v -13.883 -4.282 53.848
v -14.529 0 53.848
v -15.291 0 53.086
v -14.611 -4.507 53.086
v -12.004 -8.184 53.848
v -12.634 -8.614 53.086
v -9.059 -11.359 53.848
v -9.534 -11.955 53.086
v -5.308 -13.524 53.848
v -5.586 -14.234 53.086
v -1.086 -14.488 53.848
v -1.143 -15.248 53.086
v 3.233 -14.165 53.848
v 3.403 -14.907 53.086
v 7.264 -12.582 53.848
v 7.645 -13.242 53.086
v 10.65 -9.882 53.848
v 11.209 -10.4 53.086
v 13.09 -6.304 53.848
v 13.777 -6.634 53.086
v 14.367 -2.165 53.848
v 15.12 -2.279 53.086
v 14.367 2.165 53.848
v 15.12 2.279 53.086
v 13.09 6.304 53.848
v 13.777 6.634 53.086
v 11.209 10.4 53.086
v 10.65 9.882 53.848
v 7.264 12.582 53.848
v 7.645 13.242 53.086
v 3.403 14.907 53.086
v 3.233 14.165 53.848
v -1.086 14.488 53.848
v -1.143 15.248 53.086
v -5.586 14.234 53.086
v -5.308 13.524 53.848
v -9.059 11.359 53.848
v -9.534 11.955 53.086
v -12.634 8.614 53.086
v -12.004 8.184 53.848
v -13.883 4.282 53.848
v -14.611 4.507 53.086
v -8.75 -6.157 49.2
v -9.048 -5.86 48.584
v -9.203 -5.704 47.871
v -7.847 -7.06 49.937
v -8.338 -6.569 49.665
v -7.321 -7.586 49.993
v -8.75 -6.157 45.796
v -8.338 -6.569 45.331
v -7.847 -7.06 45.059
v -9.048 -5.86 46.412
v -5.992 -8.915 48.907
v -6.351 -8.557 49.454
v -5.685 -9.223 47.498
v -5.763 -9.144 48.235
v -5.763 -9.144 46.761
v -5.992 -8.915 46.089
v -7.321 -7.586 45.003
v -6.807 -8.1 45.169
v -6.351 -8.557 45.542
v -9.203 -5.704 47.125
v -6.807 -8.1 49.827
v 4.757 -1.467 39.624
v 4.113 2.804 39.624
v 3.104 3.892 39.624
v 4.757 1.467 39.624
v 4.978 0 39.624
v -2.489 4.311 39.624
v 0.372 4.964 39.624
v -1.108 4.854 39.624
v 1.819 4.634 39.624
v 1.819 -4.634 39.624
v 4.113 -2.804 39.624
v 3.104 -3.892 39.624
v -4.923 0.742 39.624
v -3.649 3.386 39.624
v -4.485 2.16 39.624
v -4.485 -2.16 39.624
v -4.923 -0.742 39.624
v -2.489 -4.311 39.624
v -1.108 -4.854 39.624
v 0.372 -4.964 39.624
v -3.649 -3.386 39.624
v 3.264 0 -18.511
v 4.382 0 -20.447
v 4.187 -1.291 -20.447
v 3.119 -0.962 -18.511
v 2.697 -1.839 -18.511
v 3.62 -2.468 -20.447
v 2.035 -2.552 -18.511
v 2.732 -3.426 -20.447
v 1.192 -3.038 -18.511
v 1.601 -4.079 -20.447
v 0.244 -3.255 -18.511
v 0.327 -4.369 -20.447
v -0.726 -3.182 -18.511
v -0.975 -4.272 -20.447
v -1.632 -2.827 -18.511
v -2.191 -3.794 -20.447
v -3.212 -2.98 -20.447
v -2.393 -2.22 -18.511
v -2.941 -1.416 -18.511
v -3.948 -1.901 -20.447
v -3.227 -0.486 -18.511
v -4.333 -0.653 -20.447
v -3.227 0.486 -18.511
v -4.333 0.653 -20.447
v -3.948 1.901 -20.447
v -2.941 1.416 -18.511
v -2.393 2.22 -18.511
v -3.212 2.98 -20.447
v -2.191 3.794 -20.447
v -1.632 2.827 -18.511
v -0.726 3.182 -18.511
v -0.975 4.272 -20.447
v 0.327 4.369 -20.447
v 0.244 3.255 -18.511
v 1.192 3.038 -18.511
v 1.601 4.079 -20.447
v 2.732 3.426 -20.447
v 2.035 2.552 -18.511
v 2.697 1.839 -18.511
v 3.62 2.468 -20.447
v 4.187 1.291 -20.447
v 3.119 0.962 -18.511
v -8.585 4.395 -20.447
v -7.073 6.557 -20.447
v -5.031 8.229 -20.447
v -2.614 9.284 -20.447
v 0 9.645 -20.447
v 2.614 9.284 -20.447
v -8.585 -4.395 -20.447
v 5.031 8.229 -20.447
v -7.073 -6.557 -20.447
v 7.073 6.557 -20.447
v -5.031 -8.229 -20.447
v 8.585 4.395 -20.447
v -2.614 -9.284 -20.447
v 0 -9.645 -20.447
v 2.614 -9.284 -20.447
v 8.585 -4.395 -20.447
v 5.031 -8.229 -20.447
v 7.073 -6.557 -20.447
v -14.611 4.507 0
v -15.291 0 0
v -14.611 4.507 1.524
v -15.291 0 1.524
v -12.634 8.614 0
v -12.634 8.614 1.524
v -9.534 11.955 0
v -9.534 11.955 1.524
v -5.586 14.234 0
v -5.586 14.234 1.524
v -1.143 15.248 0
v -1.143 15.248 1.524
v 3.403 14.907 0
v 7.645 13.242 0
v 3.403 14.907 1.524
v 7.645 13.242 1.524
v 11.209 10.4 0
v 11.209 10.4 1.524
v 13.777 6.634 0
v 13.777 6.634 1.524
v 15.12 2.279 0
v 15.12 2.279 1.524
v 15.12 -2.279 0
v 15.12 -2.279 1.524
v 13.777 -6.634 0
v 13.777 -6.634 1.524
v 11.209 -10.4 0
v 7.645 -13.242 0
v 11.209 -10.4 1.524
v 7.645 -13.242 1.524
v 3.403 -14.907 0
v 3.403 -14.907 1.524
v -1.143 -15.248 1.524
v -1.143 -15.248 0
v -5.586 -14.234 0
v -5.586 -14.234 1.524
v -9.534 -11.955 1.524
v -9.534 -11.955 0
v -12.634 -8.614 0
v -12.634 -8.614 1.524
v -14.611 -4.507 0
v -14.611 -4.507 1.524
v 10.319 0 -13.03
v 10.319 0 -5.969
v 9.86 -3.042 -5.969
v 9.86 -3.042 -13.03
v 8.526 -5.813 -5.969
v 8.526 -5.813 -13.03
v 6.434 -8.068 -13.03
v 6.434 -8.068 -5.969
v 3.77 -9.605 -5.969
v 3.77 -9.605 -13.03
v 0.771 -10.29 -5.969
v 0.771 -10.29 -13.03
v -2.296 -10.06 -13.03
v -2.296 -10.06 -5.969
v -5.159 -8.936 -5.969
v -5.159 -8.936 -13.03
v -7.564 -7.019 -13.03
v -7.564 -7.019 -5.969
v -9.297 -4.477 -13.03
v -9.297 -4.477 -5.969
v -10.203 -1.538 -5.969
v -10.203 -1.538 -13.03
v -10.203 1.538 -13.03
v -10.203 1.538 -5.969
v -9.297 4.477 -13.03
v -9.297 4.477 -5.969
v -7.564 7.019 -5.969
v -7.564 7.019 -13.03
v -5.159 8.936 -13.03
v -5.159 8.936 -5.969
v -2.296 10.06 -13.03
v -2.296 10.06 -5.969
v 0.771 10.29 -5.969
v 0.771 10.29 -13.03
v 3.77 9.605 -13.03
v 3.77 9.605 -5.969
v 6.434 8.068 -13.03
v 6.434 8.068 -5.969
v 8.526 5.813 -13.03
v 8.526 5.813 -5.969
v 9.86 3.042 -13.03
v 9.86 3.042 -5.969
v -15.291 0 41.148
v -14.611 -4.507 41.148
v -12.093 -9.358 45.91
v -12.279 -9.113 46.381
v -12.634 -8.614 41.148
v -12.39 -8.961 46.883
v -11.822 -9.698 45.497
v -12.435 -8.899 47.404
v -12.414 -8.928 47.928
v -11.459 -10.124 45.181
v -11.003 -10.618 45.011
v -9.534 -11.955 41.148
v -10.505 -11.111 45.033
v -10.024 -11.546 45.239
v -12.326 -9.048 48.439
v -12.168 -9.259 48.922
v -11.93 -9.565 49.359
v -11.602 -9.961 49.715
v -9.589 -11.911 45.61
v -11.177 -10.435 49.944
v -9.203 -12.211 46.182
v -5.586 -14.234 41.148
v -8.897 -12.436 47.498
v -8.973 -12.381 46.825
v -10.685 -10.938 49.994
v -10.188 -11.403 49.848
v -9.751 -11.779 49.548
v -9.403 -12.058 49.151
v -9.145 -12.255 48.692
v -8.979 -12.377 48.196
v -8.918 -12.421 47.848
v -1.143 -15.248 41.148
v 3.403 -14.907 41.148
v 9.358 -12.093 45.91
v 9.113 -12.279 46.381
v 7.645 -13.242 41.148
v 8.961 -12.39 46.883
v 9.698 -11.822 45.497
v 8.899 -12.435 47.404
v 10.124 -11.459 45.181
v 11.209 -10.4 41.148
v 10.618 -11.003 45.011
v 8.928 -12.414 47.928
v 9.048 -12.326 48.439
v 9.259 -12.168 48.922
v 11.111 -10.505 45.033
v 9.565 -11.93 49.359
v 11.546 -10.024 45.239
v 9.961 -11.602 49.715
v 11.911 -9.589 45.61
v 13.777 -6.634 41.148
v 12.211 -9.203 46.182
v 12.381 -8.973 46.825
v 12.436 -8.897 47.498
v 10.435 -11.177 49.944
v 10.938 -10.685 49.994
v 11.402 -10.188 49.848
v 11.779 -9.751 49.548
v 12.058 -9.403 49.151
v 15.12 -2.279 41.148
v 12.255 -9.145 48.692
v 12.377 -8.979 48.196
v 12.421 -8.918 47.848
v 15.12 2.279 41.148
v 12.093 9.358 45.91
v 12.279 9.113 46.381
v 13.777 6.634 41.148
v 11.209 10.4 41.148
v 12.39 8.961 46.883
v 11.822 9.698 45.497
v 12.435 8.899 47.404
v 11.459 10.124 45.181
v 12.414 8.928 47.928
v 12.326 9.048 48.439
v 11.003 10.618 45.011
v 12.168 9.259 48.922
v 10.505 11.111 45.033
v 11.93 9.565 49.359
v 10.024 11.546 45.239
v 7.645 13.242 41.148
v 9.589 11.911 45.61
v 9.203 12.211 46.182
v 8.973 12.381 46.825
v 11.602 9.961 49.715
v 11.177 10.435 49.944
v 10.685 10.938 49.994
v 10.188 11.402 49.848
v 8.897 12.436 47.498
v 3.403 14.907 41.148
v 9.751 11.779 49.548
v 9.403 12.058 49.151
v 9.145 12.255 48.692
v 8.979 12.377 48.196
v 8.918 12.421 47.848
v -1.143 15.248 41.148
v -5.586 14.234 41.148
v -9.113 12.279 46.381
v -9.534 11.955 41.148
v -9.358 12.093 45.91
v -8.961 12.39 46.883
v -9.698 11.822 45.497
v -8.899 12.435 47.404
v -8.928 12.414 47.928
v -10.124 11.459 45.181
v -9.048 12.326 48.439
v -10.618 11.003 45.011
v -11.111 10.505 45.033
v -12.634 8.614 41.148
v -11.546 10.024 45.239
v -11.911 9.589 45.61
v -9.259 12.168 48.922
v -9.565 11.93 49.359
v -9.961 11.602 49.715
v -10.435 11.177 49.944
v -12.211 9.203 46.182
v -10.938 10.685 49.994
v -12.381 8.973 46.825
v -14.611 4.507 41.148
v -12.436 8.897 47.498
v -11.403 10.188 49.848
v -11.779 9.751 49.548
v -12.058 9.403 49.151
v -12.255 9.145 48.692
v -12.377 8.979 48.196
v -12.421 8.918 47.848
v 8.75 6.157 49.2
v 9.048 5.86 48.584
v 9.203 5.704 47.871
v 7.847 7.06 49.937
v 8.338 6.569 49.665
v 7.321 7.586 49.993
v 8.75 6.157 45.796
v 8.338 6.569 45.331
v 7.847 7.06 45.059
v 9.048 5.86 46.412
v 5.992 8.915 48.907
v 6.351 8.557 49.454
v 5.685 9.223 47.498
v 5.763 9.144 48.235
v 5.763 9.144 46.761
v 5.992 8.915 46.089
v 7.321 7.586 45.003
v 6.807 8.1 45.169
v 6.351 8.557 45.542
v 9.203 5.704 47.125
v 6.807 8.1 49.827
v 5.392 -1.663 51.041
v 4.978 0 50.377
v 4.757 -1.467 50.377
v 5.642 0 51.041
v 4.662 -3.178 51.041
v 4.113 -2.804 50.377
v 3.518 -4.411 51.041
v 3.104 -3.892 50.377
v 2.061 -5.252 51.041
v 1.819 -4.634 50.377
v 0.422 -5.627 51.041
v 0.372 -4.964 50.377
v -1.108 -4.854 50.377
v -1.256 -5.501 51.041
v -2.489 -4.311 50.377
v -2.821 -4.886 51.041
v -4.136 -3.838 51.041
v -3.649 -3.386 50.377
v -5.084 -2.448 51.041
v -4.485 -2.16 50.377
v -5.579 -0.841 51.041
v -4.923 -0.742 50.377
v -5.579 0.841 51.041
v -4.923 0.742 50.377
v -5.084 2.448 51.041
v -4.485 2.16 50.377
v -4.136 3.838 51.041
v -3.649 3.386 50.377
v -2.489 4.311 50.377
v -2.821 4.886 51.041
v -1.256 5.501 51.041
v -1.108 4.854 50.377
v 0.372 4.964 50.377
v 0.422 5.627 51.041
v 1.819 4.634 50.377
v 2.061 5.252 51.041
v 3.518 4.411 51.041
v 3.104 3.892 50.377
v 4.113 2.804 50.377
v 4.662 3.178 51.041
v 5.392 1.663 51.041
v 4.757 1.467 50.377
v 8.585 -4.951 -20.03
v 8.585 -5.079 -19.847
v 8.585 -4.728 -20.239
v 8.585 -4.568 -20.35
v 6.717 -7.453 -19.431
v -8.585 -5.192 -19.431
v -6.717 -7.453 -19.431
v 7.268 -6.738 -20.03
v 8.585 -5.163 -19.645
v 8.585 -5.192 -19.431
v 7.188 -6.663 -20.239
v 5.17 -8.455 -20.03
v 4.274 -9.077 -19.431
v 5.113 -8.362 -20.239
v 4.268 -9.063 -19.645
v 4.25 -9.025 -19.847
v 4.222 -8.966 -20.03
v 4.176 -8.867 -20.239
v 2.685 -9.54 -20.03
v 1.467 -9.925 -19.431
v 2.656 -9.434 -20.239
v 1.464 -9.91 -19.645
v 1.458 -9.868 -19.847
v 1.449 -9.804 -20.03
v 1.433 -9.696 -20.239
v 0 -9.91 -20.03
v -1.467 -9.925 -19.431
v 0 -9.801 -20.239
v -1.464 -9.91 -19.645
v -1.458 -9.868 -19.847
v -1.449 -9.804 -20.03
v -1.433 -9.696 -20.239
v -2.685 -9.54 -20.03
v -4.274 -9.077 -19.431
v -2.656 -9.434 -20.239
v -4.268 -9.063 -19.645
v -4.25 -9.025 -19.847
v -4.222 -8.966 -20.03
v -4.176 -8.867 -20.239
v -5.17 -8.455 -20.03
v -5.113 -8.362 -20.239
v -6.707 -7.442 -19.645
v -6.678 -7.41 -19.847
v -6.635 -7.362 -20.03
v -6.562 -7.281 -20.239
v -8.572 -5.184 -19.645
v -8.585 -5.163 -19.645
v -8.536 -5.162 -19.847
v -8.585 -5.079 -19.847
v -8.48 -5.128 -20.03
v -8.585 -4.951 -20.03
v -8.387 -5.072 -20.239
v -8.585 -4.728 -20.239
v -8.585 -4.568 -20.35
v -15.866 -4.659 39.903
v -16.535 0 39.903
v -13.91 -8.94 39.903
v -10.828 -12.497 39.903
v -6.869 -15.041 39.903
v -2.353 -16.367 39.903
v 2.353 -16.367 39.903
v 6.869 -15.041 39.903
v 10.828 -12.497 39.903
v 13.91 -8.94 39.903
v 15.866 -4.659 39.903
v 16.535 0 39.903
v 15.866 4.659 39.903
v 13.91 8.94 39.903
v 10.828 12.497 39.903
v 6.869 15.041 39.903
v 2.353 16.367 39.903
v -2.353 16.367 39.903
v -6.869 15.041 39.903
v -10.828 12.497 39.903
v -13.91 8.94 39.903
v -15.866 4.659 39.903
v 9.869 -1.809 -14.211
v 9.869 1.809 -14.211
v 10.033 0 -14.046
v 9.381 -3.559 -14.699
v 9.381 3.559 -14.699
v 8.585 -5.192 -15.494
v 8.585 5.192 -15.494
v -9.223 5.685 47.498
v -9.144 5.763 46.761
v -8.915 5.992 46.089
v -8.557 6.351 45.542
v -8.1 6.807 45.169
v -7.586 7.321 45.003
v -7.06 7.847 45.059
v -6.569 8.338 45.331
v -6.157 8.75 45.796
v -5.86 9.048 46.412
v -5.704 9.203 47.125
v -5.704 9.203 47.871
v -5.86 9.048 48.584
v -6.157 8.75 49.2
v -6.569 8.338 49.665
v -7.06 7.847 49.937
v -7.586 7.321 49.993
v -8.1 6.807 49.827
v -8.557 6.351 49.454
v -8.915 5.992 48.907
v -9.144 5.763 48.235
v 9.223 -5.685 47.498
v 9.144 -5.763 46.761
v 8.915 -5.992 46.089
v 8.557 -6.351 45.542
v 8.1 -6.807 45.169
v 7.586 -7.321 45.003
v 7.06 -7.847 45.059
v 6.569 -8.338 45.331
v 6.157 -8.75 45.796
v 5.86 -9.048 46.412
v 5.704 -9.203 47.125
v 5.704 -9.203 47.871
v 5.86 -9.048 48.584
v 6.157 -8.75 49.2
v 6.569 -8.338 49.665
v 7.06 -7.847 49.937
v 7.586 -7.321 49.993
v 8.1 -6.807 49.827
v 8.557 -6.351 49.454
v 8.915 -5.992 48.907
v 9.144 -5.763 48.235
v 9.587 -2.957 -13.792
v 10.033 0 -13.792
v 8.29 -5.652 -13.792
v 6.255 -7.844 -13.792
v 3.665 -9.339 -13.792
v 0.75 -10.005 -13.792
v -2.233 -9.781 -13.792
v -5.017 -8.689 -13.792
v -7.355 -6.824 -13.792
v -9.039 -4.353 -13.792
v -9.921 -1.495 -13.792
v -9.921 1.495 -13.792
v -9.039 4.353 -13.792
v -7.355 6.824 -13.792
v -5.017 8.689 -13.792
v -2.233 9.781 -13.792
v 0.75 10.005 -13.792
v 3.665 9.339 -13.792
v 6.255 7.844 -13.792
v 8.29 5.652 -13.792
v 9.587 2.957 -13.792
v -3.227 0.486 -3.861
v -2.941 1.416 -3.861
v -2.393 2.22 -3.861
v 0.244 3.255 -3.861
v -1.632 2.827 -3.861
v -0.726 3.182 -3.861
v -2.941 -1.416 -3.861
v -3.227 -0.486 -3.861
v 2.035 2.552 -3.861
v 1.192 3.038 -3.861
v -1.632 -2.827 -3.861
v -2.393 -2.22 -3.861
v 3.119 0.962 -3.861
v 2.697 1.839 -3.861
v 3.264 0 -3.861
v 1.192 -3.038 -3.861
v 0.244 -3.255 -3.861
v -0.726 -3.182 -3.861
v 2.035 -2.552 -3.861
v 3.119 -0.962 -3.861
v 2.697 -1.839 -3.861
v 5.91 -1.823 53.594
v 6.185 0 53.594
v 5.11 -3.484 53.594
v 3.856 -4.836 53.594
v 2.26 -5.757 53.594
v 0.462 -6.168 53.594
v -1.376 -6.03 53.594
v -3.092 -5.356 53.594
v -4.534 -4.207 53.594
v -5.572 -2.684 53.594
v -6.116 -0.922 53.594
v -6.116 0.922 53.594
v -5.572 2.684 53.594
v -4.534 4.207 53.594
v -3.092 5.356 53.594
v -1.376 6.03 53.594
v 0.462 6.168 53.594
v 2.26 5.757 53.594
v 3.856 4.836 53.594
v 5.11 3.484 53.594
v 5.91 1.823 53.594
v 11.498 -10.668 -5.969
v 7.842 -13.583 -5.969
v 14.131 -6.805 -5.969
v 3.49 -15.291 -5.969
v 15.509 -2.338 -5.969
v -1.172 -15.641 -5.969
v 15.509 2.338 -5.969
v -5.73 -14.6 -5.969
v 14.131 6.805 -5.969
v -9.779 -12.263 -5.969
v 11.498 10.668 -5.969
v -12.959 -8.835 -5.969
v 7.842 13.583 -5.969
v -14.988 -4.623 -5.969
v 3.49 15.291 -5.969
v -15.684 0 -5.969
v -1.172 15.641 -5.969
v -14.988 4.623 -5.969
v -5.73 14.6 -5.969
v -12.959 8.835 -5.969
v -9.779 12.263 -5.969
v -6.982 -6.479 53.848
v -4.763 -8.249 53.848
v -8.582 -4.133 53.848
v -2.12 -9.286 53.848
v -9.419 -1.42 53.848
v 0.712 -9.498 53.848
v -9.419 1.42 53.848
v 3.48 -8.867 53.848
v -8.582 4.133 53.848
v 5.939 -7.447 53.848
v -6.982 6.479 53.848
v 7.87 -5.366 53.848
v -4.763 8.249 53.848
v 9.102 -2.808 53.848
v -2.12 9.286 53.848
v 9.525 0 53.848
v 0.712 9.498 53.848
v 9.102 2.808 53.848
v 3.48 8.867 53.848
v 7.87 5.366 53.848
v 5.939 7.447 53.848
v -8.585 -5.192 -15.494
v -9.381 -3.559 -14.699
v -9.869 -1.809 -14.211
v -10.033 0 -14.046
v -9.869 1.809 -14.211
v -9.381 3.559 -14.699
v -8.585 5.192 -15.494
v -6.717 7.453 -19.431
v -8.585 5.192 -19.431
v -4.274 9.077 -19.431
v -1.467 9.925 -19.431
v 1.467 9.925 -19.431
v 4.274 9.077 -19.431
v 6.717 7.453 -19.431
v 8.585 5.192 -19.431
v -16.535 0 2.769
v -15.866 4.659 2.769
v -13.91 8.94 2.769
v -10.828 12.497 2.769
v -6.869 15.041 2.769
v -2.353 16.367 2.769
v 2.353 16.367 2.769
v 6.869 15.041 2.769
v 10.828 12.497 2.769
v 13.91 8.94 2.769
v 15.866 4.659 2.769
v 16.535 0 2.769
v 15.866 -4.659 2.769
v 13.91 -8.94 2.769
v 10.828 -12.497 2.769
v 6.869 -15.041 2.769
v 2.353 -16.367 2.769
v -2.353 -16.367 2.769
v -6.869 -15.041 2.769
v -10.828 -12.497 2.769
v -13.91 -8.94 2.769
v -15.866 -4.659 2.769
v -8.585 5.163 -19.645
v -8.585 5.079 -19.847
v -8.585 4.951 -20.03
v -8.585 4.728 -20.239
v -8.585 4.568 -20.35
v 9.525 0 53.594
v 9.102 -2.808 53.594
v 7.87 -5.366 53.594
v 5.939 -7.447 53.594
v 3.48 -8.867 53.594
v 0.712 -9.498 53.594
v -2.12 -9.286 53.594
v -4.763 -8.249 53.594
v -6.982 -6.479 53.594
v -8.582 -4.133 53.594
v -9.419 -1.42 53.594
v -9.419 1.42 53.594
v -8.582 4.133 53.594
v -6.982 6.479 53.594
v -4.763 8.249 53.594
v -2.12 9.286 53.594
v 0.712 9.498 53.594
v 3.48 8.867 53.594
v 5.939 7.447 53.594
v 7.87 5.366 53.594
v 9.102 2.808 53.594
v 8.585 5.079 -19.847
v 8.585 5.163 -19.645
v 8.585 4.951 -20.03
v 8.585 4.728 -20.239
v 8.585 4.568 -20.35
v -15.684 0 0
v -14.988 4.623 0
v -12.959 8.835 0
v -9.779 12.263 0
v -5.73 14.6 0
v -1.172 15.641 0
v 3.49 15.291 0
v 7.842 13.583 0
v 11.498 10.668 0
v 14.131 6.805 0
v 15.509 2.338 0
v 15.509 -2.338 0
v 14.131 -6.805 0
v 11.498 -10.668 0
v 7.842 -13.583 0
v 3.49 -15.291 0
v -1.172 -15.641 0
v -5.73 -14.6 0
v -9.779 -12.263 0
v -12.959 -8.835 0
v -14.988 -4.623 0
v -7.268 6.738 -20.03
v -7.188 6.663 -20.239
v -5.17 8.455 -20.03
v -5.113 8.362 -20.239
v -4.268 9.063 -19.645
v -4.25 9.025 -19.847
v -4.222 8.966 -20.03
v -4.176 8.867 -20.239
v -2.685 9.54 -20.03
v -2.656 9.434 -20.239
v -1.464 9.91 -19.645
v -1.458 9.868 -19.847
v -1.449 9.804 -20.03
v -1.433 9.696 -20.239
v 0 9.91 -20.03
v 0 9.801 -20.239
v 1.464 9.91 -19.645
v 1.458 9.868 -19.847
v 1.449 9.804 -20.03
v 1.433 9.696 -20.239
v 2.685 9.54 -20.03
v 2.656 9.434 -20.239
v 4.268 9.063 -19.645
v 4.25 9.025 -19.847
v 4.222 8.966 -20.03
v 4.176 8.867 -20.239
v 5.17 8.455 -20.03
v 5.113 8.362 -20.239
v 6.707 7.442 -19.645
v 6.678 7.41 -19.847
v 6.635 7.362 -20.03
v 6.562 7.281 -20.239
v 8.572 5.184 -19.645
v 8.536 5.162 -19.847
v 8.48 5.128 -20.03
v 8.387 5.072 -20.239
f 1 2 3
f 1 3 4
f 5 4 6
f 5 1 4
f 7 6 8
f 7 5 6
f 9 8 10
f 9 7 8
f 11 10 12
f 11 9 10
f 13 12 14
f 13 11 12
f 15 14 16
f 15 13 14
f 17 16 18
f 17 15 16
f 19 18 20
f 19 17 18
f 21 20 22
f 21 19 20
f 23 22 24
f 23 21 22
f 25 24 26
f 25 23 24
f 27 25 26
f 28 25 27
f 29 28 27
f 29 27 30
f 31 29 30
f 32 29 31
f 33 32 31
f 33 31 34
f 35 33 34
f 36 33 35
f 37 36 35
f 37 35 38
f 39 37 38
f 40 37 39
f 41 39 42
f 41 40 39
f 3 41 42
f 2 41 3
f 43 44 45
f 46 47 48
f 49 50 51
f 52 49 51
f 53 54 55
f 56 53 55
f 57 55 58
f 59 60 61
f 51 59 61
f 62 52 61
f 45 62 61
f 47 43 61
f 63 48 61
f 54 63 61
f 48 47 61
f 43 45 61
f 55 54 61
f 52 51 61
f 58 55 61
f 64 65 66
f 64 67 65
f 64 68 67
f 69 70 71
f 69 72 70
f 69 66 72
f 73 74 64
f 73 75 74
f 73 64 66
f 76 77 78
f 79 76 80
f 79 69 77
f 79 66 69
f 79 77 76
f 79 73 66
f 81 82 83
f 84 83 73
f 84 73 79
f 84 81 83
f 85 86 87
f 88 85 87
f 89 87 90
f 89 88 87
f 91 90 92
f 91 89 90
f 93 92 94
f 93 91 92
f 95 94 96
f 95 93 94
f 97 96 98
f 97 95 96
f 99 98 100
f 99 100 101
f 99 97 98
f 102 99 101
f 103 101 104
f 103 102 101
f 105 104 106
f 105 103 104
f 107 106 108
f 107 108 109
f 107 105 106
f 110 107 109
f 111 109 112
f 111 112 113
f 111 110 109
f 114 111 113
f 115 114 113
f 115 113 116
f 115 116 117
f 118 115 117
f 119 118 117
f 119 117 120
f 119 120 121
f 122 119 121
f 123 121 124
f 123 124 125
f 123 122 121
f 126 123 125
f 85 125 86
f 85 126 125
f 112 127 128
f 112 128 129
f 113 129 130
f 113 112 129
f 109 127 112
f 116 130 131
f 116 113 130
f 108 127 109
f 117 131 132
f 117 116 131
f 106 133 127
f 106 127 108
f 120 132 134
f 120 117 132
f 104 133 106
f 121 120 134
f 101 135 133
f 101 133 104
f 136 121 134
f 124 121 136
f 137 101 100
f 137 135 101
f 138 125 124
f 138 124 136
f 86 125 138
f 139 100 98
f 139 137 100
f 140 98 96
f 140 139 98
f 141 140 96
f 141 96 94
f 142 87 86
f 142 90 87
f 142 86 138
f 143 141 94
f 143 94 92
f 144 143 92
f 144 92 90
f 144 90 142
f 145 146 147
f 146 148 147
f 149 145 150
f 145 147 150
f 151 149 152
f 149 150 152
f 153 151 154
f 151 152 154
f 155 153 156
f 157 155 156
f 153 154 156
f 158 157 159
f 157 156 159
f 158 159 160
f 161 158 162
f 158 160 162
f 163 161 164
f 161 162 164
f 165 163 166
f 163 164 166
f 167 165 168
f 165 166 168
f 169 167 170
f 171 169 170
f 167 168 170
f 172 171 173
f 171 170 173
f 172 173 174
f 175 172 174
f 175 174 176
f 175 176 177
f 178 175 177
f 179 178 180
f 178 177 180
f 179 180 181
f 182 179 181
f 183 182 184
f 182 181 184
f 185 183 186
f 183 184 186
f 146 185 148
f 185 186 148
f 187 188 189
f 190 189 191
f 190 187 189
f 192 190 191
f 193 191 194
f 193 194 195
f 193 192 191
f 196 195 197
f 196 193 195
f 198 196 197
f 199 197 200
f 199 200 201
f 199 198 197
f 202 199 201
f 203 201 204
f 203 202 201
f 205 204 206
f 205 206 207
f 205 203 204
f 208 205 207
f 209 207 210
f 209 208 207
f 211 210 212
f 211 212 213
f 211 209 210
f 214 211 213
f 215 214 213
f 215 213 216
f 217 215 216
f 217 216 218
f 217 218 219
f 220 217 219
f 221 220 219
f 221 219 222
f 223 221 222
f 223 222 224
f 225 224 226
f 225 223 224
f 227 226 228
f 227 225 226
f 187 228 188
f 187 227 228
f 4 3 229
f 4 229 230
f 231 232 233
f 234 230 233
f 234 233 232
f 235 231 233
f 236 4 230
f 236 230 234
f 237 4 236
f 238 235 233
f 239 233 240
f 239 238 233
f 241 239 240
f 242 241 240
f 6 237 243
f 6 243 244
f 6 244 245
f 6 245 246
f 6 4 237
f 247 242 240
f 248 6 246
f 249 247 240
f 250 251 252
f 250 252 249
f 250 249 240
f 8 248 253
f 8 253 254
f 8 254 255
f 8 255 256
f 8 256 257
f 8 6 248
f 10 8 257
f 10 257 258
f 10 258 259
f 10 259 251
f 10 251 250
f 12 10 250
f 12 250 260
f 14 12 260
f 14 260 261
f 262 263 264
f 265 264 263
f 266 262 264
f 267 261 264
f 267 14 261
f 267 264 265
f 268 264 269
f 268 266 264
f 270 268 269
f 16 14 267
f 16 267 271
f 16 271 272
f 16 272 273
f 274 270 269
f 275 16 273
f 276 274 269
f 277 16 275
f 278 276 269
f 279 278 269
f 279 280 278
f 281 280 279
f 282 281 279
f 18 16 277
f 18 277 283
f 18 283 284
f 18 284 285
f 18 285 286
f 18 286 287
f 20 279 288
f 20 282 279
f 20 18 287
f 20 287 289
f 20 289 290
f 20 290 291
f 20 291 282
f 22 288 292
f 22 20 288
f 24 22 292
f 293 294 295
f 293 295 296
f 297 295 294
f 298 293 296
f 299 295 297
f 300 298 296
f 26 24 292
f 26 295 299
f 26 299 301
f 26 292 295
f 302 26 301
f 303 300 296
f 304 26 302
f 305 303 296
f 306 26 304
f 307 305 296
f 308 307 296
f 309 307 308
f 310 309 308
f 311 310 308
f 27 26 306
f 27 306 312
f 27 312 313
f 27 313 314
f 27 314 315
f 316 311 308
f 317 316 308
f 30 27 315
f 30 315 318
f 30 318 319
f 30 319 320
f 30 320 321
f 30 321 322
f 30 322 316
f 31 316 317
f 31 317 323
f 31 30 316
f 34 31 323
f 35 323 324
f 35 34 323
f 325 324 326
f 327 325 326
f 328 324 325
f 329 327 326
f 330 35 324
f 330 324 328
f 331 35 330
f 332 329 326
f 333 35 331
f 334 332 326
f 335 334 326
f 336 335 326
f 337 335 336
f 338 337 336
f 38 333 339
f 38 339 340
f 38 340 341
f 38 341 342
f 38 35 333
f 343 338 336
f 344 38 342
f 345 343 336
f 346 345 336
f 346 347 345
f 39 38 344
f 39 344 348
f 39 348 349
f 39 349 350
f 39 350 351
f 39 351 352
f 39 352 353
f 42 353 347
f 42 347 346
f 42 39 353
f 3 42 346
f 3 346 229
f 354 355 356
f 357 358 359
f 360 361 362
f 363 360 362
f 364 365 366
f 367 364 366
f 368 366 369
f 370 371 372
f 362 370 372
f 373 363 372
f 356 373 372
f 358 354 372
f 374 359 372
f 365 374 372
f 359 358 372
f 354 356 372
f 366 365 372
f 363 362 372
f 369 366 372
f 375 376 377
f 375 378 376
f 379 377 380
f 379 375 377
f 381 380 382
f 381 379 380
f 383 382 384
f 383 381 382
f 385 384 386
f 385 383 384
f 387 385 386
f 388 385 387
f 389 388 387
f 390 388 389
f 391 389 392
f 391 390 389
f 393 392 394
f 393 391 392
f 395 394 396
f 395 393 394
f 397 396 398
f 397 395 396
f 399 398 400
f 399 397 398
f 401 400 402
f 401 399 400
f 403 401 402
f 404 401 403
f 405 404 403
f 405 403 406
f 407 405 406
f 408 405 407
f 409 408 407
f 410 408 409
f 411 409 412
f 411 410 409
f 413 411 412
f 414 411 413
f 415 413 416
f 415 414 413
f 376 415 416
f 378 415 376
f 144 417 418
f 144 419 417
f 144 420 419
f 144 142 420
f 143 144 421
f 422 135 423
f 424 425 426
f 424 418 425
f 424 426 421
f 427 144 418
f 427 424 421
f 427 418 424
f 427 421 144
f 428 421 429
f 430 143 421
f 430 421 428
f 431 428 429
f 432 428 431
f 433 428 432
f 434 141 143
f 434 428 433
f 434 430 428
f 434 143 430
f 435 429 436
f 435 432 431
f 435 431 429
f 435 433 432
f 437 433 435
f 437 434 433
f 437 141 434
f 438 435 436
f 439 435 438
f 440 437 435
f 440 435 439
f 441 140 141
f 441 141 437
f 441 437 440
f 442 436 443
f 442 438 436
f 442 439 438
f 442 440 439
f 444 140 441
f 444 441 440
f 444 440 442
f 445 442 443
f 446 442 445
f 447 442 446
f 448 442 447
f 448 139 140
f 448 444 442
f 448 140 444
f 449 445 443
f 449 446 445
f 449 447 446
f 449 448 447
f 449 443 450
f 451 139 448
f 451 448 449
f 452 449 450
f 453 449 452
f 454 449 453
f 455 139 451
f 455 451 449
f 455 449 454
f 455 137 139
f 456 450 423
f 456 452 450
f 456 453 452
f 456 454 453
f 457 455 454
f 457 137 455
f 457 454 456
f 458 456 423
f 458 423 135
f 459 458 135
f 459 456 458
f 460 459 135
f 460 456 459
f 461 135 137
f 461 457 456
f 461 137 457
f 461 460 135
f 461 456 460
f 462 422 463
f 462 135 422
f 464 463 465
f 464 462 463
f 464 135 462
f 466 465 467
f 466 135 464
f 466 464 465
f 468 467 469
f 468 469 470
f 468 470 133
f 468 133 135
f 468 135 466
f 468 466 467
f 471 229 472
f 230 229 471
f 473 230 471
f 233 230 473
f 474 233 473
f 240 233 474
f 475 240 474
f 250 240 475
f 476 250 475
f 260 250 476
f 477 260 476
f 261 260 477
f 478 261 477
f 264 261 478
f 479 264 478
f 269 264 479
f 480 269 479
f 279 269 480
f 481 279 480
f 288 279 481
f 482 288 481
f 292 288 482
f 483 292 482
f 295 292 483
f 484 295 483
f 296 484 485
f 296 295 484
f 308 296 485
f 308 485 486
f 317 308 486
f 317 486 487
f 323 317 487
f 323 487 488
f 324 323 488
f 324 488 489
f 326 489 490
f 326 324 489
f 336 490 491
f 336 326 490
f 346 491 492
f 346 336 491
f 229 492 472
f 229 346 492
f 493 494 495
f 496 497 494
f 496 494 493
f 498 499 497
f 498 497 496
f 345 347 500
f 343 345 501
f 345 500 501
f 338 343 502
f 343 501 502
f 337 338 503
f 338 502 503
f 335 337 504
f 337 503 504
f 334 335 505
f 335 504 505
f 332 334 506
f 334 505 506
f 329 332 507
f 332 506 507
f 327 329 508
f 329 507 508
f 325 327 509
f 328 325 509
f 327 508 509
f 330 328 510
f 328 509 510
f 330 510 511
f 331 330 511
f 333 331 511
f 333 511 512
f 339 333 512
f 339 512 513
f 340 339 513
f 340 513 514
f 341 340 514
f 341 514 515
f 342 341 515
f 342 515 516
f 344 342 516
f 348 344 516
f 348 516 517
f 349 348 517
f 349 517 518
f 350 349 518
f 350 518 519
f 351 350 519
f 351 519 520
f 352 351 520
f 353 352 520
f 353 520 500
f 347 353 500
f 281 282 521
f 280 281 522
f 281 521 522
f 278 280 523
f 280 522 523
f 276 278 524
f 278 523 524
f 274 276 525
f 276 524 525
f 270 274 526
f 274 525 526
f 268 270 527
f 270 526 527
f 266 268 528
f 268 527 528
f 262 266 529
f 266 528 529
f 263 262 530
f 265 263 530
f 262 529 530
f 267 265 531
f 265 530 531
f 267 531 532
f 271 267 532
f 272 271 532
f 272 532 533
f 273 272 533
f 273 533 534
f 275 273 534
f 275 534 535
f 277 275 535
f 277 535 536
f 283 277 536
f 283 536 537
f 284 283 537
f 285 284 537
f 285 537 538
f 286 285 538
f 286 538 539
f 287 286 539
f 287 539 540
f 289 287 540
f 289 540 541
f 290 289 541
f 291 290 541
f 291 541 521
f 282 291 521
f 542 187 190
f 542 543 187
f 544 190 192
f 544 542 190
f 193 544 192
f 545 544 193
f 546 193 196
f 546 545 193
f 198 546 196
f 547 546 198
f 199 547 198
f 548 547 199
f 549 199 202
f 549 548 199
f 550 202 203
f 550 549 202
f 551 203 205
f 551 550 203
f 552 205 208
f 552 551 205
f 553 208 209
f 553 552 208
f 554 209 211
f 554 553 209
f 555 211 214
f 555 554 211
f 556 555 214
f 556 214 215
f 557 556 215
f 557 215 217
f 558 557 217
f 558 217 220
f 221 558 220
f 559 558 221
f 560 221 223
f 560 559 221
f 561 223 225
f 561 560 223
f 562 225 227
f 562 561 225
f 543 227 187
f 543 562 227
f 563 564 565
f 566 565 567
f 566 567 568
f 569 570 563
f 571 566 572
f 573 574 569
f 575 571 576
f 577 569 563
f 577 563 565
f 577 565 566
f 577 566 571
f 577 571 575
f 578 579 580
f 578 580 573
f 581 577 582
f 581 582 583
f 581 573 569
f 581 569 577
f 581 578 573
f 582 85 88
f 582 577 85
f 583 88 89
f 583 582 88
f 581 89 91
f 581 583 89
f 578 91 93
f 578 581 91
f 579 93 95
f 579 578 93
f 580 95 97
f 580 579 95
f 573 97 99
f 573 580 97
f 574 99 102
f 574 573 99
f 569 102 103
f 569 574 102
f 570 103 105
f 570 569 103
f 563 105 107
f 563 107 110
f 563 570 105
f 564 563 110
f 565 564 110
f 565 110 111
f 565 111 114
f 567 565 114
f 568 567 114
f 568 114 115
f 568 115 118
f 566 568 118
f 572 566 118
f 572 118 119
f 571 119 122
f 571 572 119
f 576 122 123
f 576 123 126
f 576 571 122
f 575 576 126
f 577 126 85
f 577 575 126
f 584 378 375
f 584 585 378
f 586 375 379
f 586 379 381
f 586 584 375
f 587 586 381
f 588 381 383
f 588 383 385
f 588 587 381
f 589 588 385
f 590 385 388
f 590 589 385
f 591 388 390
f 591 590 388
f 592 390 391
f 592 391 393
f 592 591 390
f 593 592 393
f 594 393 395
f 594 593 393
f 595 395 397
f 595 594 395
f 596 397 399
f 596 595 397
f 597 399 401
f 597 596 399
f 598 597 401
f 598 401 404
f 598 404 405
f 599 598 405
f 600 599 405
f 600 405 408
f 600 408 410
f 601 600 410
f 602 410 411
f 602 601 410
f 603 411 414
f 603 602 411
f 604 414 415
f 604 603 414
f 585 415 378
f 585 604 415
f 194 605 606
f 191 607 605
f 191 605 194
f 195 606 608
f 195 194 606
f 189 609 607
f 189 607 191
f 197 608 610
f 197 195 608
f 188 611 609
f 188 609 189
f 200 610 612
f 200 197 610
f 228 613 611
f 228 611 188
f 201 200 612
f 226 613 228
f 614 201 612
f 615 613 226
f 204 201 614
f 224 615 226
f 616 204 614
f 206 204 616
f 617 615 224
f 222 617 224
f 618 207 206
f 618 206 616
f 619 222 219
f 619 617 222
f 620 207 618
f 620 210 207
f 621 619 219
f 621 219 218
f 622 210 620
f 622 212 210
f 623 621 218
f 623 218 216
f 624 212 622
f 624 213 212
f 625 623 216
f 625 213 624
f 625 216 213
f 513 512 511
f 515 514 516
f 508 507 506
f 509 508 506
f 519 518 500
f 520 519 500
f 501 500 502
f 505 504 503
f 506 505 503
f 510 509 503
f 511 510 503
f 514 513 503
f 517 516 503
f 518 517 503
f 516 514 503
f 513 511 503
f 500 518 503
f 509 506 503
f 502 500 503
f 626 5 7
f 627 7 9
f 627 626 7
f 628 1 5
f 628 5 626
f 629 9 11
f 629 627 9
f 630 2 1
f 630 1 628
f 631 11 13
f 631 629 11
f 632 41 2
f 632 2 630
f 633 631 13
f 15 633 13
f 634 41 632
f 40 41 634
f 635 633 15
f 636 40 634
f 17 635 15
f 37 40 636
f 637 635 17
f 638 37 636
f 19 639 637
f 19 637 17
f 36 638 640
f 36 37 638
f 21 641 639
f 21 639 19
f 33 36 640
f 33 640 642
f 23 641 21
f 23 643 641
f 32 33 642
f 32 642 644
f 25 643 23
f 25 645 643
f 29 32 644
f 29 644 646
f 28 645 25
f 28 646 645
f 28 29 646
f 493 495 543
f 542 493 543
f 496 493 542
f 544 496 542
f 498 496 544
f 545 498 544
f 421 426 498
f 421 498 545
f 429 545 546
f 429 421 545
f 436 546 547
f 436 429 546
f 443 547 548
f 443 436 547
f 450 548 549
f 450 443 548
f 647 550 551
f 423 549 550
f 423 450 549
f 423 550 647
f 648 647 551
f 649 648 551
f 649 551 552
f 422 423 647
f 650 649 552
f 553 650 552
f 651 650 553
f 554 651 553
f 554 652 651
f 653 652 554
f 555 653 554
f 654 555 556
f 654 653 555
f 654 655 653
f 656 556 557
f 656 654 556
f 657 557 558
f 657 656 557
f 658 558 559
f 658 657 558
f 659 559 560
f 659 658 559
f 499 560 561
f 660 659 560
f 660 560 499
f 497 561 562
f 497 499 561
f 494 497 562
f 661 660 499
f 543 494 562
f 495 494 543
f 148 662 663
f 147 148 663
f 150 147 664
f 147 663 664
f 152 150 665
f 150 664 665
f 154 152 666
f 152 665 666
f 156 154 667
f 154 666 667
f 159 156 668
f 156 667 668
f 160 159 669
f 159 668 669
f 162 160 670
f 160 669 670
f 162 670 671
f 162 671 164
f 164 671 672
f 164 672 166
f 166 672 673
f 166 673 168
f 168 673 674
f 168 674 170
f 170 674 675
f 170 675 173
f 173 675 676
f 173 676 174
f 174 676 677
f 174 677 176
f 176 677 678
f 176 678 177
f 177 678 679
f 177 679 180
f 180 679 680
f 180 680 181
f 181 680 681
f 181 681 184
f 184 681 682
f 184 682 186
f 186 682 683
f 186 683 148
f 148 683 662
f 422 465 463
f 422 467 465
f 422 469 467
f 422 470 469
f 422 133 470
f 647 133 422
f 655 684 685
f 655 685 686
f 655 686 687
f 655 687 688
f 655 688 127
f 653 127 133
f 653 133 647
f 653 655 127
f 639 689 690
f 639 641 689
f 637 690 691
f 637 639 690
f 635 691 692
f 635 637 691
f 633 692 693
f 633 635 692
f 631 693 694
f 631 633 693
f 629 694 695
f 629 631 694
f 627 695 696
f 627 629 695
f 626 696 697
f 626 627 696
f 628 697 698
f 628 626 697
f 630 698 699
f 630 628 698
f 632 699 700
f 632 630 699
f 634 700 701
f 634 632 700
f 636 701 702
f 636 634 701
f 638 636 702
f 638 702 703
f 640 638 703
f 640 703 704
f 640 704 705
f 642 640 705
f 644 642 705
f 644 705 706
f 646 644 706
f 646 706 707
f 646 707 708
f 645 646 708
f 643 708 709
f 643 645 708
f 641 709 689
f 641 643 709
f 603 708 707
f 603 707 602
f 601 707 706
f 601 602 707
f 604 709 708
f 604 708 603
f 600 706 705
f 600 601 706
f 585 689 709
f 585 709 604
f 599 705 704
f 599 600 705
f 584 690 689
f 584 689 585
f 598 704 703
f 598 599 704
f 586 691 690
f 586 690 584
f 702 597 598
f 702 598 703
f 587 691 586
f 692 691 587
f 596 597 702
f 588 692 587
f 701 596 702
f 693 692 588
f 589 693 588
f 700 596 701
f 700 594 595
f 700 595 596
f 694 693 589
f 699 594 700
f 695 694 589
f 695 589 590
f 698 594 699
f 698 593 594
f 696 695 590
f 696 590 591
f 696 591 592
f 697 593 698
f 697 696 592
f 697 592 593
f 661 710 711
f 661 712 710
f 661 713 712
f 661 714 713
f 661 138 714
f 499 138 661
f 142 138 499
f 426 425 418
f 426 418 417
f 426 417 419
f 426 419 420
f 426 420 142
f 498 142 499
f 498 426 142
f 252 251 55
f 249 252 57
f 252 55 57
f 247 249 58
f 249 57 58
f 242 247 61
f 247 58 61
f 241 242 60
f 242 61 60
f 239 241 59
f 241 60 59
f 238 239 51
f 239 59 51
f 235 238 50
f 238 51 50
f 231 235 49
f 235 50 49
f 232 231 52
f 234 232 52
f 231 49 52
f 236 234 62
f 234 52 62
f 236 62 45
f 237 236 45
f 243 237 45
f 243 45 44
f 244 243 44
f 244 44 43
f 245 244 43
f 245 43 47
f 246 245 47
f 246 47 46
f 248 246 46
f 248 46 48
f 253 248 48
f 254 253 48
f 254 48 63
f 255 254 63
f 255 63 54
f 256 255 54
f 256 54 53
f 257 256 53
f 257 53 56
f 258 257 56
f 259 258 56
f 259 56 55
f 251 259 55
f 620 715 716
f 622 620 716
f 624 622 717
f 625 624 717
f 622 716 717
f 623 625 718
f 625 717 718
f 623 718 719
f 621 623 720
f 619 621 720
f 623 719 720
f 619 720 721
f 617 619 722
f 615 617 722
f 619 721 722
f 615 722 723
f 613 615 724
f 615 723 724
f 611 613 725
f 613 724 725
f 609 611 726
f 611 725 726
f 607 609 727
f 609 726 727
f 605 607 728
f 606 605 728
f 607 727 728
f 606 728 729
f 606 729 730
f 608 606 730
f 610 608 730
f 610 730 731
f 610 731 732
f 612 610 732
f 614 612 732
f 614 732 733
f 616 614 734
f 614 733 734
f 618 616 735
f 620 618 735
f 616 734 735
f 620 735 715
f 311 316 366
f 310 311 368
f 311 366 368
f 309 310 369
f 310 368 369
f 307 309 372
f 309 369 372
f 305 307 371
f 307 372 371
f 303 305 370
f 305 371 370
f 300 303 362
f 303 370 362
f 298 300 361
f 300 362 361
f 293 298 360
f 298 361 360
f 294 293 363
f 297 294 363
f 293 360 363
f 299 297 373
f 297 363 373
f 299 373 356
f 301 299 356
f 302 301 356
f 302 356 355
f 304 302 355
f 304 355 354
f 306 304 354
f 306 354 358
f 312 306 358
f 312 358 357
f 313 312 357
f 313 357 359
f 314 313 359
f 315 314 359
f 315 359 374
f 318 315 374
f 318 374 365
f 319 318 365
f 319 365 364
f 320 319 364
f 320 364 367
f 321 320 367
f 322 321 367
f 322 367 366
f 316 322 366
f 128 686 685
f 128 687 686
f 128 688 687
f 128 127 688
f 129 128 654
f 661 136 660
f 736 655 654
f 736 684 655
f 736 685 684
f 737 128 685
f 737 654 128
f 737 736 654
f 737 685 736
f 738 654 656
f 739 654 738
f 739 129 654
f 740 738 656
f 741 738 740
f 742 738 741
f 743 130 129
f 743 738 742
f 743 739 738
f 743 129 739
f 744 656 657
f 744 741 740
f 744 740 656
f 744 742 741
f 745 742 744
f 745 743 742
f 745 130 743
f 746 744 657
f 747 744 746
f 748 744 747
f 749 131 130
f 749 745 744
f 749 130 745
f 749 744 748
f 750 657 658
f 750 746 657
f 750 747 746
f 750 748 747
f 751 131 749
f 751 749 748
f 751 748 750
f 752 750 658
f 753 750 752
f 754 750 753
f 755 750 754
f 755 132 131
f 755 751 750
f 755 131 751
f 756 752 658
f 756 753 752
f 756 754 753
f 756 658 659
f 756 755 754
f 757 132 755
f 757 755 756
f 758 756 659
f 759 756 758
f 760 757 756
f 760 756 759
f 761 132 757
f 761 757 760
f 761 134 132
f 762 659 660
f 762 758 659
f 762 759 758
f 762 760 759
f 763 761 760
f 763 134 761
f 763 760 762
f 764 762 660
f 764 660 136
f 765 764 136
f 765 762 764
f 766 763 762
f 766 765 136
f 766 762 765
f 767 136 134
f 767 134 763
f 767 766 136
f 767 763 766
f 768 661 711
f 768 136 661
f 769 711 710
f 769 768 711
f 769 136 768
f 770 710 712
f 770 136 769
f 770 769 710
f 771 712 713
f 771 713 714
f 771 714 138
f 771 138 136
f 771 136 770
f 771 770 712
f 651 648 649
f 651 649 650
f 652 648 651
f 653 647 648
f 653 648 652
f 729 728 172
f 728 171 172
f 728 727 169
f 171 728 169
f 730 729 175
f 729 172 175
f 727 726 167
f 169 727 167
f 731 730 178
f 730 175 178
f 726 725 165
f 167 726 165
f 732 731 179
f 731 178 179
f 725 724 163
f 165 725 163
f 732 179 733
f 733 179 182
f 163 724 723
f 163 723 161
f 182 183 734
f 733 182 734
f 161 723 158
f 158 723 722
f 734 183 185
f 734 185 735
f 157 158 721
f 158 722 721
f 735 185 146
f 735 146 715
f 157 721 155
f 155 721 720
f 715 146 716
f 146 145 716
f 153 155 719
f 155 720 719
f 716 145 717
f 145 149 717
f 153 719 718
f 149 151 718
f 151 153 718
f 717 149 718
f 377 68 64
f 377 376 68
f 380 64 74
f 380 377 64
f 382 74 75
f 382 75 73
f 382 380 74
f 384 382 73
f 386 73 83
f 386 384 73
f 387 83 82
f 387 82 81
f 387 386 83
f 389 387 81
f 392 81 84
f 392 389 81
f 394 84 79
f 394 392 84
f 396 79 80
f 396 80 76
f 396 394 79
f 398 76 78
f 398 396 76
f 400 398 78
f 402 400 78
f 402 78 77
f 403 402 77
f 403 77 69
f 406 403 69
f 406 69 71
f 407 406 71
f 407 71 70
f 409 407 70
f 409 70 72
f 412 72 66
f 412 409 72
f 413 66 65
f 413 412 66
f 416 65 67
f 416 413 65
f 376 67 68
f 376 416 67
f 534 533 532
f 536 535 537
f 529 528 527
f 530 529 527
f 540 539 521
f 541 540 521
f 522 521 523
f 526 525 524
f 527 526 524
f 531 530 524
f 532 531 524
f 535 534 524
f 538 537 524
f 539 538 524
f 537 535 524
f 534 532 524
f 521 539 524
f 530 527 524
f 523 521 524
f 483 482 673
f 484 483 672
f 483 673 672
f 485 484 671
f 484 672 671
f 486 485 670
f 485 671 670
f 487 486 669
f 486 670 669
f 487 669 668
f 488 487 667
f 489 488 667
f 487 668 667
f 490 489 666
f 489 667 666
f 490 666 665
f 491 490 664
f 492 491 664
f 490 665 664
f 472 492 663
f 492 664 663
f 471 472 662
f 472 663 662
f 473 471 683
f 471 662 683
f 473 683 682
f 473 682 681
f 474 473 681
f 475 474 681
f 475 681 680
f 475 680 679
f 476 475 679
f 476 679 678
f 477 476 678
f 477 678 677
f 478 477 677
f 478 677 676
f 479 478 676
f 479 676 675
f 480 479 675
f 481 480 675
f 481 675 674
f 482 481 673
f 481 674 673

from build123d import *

# Parameters (mm, degrees)
SKETCH1_R          = 16.5354
EXTRUDE1_DEPTH     = 53.848
CHAMFER1_SIZE      = 0.762
SKETCH6_R          = 15.6845
EXTRUDE2_DEPTH     = 5.969
SKETCH7_W          = 14.478
SKETCH7_H          = 10.31875
CUT_EXTRUDE4_DEPTH = 19.84248
HOLE1_D            = 5.0038
HOLE1_DEPTH        = 4.7498
CIRPATTERN1_COUNT  = 4


with BuildPart() as part:
    # Sketch1 → Extrude1 (new body)
    with BuildSketch(Plane.XY):
        Circle(SKETCH1_R)
    extrude(amount=EXTRUDE1_DEPTH)

    # Sketch2 → Cut-Revolve1 (revolve, cut)
    with BuildSketch(Plane(origin=(0, 0, 0), x_dir=(1, 0, 0), z_dir=(0, 1, 0)), mode=Mode.PRIVATE) as cut_revolve1_sk:
        Polygon((16.5354, -53.848), (16.5354, -39.9034), (15.2908, -41.148), (15.2908, -53.848), align=None)
    revolve(cut_revolve1_sk.sketch.rotate(Axis((0, 0, 0), (0, 0, 1)), 180), axis=Axis((0, 0, 0), (0, 0, 1)), mode=Mode.SUBTRACT)  # turned: the seam where the file's is

    # Sketch3 → Cut-Revolve2 (revolve, cut)
    with BuildSketch(Plane(origin=(0, 0, 0), x_dir=(1, 0, 0), z_dir=(0, 1, 0)), mode=Mode.PRIVATE) as cut_revolve2_sk:
        Polygon((15.2908, 0), (15.2908, -1.524), (16.5354, -2.7686), (16.5354, 0), align=None)
    revolve(cut_revolve2_sk.sketch.rotate(Axis((0, 0, 0), (0, 0, -1)), 180), axis=Axis((0, 0, 0), (0, 0, -1)), mode=Mode.SUBTRACT)  # turned: the seam where the file's is

    # S2D0002 → Cut-Revolve3 (revolve, cut)
    with BuildSketch(Plane(origin=(0, 0, 0), x_dir=(1, 0, 0), z_dir=(0, 1, 0))):
        Polygon((6.1849, -53.594), (9.525, -53.594), (9.525, -53.848), (0, -53.848), (0, -39.624), (4.9784, -39.624), (4.9784, -50.377393135), (5.642306865, -51.0413), align=None)
    revolve(axis=Axis((0, 0, 14.6685), (0, 0, -1)), mode=Mode.SUBTRACT)

    # Chamfer1
    chamfer1_edges = [part.edges().sort_by_distance(p)[0] for p in [
        (15.2908, 0, 53.848),
    ]]
    chamfer(chamfer1_edges, length=CHAMFER1_SIZE)

    # Sketch6 → Extrude2 (add)
    with BuildSketch(Plane(origin=(0, 0, 0), x_dir=(-1, 0, 0), z_dir=(0, 0, -1))):
        Circle(SKETCH6_R)
    extrude(amount=EXTRUDE2_DEPTH)

    # Sketch7 → Revolve1 (revolve)
    with BuildSketch(Plane(origin=(0, 0, 0), x_dir=(0, 0, -1), z_dir=(1, 0, 0)), mode=Mode.PRIVATE) as revolve1_sk:
        with Locations((13.208, -5.159375)):
            Rectangle(SKETCH7_W, SKETCH7_H)
    revolve(revolve1_sk.sketch.rotate(Axis((0, 0, 0), (0, 0, -1)), 270), axis=Axis((0, 0, 0), (0, 0, -1)))  # turned: the seam where the file's is

    # S2D0001 → Cut-Revolve5 (revolve, cut)
    with BuildSketch(Plane(origin=(0, 0, 0), x_dir=(1, 0, 0), z_dir=(0, 1, 0))):
        Polygon((3.2639, 18.511260017), (3.2639, 3.8608), (0, 3.8608), (0, 20.447), (4.3815, 20.447), align=None)
    revolve(axis=Axis((0, 0, 31.308359971), (0, 0, -1)), mode=Mode.SUBTRACT)

    # Sketch9 → Cut-Revolve6 (revolve, cut)
    with BuildSketch(Plane(origin=(0, 0, 0), x_dir=(0, -1, 0), z_dir=(1, 0, 0)), mode=Mode.PRIVATE) as cut_revolve6_sk:
        with BuildLine():
            Line((-10.31875, 13.0302), (-10.033, 13.7922))
            Line((-10.033, 13.7922), (-10.033, 19.431))
            ThreePointArc((-10.033, 19.431), (-9.932678675, 19.974796865), (-9.644922533, 20.447))
            Line((-9.644922533, 20.447), (-10.31875, 20.447))
            Line((-10.31875, 20.447), (-10.31875, 13.0302))
        make_face()
    revolve(cut_revolve6_sk.sketch.rotate(Axis((0, 0, -12.65936), (0, 0, -1)), 90), axis=Axis((0, 0, -12.65936), (0, 0, -1)), mode=Mode.SUBTRACT)  # turned: the seam where the file's is

    # Sketch13 → Cut-Extrude4 (cut, symmetric)
    with BuildSketch(Plane(origin=(0, 0, 0), x_dir=(1, 0, 0), z_dir=(0, 1, 0))):
        Polygon((8.5852, 20.447), (8.5852, 15.494), (10.033, 14.0462), (10.033, 20.447), align=None)
        Polygon((-8.5852, 20.447), (-8.5852, 15.494), (-10.033, 14.0462), (-10.033, 20.447), align=None)
    extrude(amount=CUT_EXTRUDE4_DEPTH, both=True, mode=Mode.SUBTRACT)

    # Hole1
    with Locations(Plane(origin=(-10.81222837, 10.81222837, 47.498), x_dir=(0.707106781, 0.707106781, 0), z_dir=(-0.707106781, 0.707106781, 0))):
        with Locations((0, 0)):
            hole1 = Hole(HOLE1_D / 2, depth=HOLE1_DEPTH)

    # CirPattern1: Hole1 ×4 about axis
    cirpattern1_axis = Axis((0, 0, 0), (0, 0, 1))
    for i in range(1, CIRPATTERN1_COUNT):
        add(hole1.rotate(cirpattern1_axis, i * 360 / CIRPATTERN1_COUNT), mode=Mode.SUBTRACT)


solid = part.part
